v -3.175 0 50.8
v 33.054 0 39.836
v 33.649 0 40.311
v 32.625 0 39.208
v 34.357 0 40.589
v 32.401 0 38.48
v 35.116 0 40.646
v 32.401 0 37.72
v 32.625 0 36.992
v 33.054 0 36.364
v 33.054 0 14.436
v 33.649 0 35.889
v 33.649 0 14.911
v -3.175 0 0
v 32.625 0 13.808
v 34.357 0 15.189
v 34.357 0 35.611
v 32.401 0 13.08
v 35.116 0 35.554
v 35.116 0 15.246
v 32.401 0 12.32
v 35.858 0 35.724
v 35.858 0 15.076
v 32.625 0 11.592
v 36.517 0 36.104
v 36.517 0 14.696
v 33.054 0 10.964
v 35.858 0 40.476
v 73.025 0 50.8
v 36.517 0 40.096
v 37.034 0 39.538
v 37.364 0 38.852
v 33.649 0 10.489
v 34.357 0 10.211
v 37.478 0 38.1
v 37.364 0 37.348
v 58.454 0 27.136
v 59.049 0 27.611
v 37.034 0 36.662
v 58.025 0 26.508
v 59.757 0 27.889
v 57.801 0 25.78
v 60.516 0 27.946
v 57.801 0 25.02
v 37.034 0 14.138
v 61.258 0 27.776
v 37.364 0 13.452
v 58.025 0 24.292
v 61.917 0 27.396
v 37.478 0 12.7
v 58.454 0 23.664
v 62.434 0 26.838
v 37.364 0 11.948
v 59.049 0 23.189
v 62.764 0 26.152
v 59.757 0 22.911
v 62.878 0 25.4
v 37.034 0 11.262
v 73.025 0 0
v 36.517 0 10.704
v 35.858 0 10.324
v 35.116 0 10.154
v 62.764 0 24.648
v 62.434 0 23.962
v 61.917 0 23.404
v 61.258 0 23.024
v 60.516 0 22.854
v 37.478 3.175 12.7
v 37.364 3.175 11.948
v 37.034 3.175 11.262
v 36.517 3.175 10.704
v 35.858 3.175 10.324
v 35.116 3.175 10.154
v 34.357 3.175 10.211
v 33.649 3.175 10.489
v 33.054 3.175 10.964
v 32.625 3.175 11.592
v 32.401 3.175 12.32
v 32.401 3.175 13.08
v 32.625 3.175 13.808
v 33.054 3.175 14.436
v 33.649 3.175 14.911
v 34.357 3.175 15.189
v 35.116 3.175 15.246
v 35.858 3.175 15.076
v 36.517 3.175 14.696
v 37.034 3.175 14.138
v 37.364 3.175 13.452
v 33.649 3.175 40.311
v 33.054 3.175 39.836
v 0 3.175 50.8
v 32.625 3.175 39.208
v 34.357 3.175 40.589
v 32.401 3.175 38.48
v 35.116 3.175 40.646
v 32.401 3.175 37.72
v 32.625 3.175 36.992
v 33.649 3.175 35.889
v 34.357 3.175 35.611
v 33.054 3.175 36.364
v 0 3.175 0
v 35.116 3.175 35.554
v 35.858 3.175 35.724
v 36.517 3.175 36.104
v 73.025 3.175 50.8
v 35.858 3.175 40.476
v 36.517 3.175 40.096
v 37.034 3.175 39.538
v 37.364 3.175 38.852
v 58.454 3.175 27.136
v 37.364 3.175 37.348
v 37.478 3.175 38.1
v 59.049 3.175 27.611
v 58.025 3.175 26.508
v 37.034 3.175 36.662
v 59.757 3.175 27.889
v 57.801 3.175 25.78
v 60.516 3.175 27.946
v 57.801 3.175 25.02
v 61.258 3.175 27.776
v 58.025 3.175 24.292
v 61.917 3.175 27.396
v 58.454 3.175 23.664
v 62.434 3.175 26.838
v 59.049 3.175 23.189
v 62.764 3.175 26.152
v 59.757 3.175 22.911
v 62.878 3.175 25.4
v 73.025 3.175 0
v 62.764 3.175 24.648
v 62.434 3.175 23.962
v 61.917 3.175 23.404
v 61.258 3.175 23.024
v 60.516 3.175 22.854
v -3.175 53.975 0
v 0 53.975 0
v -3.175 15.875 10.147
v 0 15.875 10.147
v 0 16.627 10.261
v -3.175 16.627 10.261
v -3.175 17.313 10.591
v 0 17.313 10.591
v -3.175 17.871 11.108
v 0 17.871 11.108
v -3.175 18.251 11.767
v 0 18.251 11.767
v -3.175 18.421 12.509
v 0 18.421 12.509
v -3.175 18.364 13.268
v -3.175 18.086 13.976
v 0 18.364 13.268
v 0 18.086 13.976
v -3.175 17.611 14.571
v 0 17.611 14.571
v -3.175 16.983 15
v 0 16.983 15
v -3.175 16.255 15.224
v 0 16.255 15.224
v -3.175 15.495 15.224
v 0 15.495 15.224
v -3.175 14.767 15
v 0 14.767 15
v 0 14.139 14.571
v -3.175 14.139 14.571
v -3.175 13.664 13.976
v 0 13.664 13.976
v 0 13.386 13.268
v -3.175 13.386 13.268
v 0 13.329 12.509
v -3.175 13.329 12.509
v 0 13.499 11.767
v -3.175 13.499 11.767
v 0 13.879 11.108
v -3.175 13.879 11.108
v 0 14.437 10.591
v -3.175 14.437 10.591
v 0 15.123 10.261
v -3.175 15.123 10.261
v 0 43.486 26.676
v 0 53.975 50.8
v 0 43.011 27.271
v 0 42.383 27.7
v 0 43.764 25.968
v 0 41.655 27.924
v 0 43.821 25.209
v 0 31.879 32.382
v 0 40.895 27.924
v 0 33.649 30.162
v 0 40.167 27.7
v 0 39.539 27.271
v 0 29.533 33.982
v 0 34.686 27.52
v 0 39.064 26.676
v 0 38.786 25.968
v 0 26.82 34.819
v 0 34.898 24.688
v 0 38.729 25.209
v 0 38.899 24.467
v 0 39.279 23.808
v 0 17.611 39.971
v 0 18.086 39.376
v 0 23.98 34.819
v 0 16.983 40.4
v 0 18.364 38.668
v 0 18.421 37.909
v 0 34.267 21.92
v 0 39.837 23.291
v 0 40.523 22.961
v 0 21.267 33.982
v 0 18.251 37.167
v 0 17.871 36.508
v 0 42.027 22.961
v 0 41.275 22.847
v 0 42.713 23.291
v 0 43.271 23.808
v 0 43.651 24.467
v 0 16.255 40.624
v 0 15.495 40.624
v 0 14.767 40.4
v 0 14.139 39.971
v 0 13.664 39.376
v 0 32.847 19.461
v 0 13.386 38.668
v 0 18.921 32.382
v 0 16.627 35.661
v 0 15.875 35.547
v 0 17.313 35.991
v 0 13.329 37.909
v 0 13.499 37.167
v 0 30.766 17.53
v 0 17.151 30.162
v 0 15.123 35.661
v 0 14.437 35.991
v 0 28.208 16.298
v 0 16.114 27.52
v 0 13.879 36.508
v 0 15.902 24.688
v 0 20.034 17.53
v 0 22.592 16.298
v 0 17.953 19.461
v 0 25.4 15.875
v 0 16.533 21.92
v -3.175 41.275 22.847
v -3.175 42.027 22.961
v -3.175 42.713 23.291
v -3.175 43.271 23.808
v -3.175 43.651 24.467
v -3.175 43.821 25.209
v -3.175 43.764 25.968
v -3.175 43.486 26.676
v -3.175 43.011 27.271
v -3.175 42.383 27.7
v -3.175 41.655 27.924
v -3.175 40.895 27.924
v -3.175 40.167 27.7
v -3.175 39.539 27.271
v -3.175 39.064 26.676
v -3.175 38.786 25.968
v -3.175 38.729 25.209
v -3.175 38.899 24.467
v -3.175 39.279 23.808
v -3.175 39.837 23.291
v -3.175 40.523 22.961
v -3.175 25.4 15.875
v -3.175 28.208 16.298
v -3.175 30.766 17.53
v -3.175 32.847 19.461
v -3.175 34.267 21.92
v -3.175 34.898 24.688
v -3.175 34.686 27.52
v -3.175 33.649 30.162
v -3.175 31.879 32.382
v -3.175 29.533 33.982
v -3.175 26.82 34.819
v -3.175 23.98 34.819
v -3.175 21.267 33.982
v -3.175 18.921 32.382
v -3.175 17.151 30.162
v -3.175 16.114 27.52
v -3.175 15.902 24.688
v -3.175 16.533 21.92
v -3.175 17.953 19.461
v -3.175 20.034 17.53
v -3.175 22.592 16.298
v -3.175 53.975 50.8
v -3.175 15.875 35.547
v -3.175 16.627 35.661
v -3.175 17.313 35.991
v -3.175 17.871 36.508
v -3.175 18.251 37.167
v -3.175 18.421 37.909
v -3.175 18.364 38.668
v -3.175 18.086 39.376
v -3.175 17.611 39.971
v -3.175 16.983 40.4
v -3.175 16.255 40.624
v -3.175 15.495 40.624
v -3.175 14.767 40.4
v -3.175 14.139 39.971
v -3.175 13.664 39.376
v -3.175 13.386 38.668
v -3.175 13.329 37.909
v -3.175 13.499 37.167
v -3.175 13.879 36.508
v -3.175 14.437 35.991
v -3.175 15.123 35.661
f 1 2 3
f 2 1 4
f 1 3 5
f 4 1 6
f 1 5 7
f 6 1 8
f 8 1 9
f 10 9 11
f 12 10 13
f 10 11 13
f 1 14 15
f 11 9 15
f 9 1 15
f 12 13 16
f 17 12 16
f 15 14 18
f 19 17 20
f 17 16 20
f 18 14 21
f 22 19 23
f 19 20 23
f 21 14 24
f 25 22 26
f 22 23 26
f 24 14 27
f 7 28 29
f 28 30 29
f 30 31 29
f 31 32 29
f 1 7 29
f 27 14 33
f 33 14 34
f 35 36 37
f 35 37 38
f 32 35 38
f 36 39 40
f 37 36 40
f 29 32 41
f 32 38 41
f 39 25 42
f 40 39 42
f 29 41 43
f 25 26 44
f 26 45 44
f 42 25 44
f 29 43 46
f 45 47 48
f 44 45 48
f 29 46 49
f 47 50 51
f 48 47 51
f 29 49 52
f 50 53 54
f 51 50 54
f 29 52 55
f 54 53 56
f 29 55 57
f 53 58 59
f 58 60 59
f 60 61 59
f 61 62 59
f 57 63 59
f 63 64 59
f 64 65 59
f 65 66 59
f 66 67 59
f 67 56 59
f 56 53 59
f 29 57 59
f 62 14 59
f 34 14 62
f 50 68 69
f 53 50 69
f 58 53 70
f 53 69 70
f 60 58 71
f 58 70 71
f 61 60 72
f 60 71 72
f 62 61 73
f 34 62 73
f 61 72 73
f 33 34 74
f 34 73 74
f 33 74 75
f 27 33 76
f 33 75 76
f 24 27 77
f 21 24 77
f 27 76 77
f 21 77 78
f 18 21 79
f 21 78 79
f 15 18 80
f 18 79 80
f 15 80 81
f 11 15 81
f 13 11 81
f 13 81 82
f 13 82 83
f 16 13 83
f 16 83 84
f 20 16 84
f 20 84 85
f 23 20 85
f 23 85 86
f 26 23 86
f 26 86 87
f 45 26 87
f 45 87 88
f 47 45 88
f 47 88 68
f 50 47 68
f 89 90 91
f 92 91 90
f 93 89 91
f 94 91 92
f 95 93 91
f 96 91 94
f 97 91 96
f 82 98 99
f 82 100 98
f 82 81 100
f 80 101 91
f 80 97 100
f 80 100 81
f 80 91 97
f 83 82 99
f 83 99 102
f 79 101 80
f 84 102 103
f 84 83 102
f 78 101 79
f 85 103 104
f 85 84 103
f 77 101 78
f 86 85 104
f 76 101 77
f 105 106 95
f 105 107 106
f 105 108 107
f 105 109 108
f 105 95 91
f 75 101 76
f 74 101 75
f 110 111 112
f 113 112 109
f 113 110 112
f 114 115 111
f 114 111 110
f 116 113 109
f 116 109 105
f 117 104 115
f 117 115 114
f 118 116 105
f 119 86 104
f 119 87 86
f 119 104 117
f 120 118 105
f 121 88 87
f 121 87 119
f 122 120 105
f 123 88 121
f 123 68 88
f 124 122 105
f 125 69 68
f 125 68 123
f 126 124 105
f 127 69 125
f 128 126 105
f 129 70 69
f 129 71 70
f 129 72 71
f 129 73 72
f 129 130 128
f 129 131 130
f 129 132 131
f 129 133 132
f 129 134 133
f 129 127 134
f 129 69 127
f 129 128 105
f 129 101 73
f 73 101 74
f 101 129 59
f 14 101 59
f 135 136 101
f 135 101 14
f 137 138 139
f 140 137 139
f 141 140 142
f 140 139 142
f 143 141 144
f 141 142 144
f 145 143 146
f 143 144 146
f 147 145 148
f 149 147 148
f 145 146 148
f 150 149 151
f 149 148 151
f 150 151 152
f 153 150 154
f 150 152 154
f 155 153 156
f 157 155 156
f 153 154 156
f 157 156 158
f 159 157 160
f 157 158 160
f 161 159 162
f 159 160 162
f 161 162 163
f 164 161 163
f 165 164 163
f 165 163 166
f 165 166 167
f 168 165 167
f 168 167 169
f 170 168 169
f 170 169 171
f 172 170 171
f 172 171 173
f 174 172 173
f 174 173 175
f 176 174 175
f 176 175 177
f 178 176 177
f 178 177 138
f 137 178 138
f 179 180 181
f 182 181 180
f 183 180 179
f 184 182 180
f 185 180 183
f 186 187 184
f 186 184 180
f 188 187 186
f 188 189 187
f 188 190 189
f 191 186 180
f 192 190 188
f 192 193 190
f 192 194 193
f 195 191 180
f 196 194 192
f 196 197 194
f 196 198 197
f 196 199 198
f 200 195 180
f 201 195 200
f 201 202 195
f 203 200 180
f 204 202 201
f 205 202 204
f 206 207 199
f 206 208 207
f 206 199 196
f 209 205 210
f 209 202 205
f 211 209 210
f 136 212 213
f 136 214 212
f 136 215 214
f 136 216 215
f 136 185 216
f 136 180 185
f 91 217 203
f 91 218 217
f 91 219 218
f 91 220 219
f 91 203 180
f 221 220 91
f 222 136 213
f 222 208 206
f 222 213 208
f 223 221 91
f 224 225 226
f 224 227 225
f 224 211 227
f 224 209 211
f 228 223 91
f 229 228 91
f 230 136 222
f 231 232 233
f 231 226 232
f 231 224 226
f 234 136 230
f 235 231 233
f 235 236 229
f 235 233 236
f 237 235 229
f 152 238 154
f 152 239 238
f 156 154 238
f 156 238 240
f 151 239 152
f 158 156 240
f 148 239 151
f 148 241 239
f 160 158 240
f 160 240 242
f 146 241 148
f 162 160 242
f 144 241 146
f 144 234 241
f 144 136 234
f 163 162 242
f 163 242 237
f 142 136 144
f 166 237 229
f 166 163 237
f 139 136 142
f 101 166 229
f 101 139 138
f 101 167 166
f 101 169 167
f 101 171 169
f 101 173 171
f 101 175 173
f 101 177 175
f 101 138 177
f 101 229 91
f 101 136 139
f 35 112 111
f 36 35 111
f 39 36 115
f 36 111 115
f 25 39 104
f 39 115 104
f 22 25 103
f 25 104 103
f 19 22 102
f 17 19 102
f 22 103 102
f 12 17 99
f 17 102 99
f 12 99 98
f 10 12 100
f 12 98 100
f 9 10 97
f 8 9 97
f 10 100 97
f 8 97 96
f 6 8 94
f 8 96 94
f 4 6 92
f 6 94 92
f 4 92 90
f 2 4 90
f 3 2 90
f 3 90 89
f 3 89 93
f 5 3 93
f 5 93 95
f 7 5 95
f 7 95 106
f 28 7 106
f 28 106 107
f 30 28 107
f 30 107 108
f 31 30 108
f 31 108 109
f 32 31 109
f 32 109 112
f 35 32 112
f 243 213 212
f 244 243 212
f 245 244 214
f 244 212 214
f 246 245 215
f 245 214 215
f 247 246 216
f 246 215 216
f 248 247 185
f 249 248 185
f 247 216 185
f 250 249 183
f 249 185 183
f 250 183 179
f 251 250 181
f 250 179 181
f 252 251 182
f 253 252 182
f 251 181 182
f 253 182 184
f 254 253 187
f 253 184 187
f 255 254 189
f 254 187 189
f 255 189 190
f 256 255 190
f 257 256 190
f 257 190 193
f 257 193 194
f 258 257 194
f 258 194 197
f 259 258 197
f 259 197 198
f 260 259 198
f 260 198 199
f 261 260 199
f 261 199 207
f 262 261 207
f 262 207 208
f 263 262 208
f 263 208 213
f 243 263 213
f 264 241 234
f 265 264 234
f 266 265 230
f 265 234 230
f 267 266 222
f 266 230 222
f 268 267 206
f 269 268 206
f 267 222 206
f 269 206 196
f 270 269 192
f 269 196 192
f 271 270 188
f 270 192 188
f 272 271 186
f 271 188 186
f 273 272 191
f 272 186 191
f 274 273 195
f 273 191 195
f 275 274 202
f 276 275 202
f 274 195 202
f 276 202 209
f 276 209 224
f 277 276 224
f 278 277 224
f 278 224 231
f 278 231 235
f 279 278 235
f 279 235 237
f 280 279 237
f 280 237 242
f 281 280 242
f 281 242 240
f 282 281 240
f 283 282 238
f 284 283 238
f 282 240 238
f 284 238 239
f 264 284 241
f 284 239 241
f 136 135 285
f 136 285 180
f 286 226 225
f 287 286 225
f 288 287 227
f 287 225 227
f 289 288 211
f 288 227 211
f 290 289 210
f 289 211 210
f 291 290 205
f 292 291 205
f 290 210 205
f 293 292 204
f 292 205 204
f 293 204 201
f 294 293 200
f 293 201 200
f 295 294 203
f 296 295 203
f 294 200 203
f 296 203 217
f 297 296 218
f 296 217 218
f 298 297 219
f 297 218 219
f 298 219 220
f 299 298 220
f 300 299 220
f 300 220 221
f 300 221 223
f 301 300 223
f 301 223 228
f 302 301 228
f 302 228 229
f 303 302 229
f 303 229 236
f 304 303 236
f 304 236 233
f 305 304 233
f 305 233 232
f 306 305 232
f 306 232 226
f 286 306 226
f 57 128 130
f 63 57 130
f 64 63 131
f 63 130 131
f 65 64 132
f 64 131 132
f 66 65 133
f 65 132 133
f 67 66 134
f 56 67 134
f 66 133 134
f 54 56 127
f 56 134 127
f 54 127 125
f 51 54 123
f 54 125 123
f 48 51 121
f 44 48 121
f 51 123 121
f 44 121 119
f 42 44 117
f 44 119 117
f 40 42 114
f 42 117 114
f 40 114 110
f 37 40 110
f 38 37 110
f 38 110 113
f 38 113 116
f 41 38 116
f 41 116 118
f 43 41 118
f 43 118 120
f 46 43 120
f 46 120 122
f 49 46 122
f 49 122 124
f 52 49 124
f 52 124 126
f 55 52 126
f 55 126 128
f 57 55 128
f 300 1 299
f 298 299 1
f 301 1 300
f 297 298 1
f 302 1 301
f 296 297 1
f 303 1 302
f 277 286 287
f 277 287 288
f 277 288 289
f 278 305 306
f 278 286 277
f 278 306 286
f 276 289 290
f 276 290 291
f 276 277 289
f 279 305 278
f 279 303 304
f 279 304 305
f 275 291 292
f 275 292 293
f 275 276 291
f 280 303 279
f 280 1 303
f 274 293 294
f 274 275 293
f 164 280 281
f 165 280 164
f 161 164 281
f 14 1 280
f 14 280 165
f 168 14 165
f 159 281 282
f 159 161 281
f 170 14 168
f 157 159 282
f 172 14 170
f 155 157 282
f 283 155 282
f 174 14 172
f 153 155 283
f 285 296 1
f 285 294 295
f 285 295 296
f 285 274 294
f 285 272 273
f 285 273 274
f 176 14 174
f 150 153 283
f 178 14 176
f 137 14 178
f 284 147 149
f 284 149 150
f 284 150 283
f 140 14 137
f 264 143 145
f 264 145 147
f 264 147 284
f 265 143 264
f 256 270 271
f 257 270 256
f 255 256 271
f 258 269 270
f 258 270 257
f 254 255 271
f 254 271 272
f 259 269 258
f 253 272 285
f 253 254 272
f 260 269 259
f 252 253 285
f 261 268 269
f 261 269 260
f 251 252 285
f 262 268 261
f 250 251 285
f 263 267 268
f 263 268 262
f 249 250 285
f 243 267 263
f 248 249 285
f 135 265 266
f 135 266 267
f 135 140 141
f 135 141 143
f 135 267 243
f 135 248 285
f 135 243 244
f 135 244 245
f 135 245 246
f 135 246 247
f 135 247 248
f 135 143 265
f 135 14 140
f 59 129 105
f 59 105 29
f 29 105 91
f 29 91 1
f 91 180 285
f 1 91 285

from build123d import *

# Parameters (mm, degrees)
BOSS_EXTRUDE1_DEPTH = 50.8
SKETCH2_R           = 2.5527
CUT_EXTRUDE1_DEPTH  = 50.8
SKETCH3_R           = 2.5527
CUT_EXTRUDE2_DEPTH  = 50.8
SKETCH4_R           = 9.525
CUT_EXTRUDE3_DEPTH  = 3.175


with BuildPart() as part:
    # Sketch1 → Boss-Extrude1 (new body)
    with BuildSketch(Plane.XY):
        Polygon((0, 0), (-3.175, 0), (-3.175, 53.975), (0, 53.975), (0, 3.175), (73.025, 3.175), (73.025, 0), align=None)
    extrude(amount=BOSS_EXTRUDE1_DEPTH)

    # Sketch2 → Cut-Extrude1 (cut)
    with BuildSketch(Plane(origin=(0, 0, 0), x_dir=(0, 0, -1), z_dir=(1, 0, 0))):
        with Locations((-25.4, 41.275)):
            Circle(SKETCH2_R)
        with Locations((-38.1, 15.875)):
            Circle(SKETCH2_R)
        with Locations((-12.7, 15.875)):
            Circle(SKETCH2_R)
    extrude(amount=-CUT_EXTRUDE1_DEPTH, mode=Mode.SUBTRACT)

    # Sketch3 → Cut-Extrude2 (cut)
    with BuildSketch(Plane(origin=(0, 3.175, 0), x_dir=(1, 0, 0), z_dir=(0, 1, 0))):
        with Locations((60.325, -25.4)):
            Circle(SKETCH3_R)
        with Locations((34.925, -12.7)):
            Circle(SKETCH3_R)
        with Locations((34.925, -38.1)):
            Circle(SKETCH3_R)
    extrude(amount=-CUT_EXTRUDE2_DEPTH, mode=Mode.SUBTRACT)

    # Sketch4 → Cut-Extrude3 (cut)
    with BuildSketch(Plane(origin=(0, 0, 0), x_dir=(0, 0, -1), z_dir=(1, 0, 0))):
        with Locations((-25.4, 25.4)):
            Circle(SKETCH4_R)
    extrude(amount=-CUT_EXTRUDE3_DEPTH, mode=Mode.SUBTRACT)


solid = part.part
